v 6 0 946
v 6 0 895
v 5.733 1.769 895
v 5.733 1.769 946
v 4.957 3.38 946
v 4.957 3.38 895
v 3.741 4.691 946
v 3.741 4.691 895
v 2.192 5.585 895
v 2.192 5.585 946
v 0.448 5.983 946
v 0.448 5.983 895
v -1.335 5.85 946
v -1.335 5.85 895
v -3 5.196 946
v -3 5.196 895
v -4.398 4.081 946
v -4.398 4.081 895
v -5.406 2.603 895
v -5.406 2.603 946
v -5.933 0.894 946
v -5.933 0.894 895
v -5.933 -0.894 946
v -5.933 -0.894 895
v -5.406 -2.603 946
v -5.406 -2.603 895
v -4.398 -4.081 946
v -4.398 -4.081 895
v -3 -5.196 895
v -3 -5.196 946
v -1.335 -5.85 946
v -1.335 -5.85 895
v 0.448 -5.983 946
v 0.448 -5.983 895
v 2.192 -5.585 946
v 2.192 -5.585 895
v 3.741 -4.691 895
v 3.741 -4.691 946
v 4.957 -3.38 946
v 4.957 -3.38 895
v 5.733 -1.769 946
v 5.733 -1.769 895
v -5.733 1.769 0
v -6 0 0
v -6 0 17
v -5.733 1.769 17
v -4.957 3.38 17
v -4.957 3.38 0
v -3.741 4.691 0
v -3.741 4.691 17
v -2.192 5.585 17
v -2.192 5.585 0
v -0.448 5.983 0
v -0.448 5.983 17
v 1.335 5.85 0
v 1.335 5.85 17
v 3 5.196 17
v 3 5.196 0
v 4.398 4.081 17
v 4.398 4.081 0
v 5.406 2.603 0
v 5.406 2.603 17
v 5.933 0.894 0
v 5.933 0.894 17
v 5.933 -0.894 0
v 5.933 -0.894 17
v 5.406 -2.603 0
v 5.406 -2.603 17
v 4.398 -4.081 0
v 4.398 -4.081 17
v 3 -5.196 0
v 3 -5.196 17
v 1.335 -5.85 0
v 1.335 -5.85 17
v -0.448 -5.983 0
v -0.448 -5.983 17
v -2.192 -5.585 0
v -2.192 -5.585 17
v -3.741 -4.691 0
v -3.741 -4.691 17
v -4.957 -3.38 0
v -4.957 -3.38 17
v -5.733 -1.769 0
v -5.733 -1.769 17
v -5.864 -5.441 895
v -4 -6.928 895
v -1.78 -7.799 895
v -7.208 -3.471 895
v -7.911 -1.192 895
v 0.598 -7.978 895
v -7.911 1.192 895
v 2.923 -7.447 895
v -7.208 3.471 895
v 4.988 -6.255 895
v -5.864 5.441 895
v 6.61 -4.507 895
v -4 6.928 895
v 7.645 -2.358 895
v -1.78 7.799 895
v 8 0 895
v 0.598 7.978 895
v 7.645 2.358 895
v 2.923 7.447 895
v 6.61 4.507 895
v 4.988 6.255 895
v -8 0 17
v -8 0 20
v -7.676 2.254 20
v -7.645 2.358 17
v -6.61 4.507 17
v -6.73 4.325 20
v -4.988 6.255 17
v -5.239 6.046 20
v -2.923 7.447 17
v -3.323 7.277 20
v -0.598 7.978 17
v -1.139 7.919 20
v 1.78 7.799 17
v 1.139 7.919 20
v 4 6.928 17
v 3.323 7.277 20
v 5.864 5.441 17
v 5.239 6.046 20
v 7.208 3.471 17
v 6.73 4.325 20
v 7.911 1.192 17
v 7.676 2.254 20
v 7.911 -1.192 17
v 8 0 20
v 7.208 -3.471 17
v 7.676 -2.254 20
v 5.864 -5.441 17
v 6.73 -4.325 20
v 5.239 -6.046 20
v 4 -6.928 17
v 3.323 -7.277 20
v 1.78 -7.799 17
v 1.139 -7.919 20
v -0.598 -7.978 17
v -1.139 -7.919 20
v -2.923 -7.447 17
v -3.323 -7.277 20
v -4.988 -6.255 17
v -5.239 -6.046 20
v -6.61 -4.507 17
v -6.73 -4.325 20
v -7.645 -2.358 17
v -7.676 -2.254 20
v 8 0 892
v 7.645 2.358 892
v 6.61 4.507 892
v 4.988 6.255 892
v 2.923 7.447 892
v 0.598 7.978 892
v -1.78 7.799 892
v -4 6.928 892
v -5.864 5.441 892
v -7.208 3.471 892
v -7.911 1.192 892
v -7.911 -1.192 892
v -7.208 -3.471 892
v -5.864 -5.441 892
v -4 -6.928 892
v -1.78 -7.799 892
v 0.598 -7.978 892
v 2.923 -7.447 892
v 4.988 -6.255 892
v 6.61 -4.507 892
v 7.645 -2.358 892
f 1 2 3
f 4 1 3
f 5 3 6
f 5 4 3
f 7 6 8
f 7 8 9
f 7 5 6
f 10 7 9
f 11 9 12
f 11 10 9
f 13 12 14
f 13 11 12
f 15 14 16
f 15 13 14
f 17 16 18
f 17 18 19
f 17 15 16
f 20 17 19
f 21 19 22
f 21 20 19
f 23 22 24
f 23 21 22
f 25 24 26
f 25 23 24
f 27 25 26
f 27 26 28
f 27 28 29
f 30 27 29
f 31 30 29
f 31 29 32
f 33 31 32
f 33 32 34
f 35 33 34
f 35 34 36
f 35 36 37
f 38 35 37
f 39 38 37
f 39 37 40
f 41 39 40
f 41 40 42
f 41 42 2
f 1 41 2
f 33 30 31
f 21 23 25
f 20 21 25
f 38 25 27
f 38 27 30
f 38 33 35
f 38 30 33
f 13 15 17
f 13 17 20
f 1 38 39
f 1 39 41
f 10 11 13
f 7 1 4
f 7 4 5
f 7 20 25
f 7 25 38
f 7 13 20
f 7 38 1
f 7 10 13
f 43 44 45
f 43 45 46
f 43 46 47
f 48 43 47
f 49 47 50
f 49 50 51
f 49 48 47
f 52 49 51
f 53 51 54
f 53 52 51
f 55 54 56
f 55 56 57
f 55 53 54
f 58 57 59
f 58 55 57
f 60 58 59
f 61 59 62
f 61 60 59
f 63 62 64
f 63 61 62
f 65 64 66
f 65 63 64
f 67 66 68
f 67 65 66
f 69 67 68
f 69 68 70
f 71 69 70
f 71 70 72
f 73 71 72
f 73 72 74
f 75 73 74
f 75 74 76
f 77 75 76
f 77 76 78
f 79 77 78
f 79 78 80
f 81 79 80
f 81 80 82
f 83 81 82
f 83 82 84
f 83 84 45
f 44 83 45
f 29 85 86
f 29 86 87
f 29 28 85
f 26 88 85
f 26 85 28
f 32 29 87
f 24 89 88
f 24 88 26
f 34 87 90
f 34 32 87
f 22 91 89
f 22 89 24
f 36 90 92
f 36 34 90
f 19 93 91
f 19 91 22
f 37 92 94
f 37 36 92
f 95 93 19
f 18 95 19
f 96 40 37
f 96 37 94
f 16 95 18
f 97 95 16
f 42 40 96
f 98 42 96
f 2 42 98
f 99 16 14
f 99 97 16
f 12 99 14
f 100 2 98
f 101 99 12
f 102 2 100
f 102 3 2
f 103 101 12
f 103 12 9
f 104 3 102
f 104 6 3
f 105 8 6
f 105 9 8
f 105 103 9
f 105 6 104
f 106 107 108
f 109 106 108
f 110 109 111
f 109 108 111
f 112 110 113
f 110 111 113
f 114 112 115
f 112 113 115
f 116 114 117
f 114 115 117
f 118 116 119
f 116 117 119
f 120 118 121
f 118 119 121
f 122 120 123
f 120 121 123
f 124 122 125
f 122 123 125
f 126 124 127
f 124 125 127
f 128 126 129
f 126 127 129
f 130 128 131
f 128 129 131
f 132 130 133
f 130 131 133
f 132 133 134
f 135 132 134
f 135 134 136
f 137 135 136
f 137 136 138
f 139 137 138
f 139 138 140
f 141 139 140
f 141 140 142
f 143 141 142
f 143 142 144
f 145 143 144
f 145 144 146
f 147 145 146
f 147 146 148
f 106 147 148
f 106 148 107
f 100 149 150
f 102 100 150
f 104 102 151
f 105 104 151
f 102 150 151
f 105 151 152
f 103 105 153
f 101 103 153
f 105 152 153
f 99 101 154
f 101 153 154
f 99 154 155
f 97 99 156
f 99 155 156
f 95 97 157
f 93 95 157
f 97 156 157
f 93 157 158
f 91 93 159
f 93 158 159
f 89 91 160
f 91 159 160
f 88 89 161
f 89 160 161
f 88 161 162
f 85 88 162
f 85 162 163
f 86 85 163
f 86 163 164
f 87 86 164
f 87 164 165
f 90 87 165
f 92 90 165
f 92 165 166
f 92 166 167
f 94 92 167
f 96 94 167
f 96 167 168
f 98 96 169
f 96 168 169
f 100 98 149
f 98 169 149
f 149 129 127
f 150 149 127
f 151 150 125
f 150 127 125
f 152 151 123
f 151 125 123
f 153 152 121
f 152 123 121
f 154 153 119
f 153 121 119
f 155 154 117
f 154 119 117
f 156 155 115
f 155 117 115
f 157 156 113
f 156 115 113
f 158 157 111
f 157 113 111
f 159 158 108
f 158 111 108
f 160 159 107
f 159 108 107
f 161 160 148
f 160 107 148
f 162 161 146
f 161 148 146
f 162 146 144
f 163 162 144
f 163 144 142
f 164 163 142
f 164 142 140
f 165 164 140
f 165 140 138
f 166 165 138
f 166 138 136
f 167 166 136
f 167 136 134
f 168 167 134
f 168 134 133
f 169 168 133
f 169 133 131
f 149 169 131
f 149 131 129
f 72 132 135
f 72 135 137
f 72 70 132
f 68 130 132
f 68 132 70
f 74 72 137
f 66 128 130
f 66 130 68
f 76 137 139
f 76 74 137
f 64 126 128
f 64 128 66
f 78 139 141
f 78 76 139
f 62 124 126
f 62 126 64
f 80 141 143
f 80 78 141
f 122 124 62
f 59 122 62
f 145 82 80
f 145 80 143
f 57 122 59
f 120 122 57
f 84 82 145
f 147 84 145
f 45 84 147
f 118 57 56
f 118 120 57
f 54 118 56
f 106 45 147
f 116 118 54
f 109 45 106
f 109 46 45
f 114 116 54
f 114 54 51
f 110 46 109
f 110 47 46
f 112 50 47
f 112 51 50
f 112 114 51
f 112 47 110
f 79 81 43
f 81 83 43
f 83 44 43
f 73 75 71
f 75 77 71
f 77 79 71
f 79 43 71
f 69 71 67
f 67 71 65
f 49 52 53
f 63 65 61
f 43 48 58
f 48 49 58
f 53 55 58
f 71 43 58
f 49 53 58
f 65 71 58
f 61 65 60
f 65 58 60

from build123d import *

# Parameters (mm, degrees)
SKETCH1_R          = 8
EXTRUDE1_DEPTH     = 946
SKETCH3_R          = 8
SKETCH3_R_2        = 6
CUT_EXTRUDE1_DEPTH = 54
SKETCH4_R          = 8
SKETCH4_R_2        = 6
CUT_EXTRUDE2_DEPTH = 20
SKETCH5_R          = 8
SKETCH5_R_2        = 6
EXTRUDE2_DEPTH     = 3
SKETCH6_R          = 8
SKETCH6_R_2        = 6
EXTRUDE3_DEPTH     = 3


with BuildPart() as part:
    # Sketch1 → Extrude1 (new body)
    with BuildSketch(Plane.XY):
        Circle(SKETCH1_R)
    extrude(amount=EXTRUDE1_DEPTH)

    # Sketch3 → Cut-Extrude1 (cut)
    with BuildSketch(Plane.XY.offset(946)):
        Circle(SKETCH3_R)
        Circle(SKETCH3_R_2, mode=Mode.SUBTRACT)
    extrude(amount=-CUT_EXTRUDE1_DEPTH, mode=Mode.SUBTRACT)

    # Sketch4 → Cut-Extrude2 (cut)
    with BuildSketch(Plane(origin=(0, 0, 0), x_dir=(-1, 0, 0), z_dir=(0, 0, -1))):
        Circle(SKETCH4_R)
        Circle(SKETCH4_R_2, mode=Mode.SUBTRACT)
    extrude(amount=-CUT_EXTRUDE2_DEPTH, mode=Mode.SUBTRACT)

    # Sketch5 → Extrude2 (add)
    with BuildSketch(Plane(origin=(0, 0, 20), x_dir=(-1, 0, 0), z_dir=(0, 0, -1))):
        Circle(SKETCH5_R)
        Circle(SKETCH5_R_2, mode=Mode.SUBTRACT)
    extrude(amount=EXTRUDE2_DEPTH)

    # Sketch6 → Extrude3 (add)
    with BuildSketch(Plane.XY.offset(892)):
        Circle(SKETCH6_R)
        Circle(SKETCH6_R_2, mode=Mode.SUBTRACT)
    extrude(amount=EXTRUDE3_DEPTH)


solid = part.part
